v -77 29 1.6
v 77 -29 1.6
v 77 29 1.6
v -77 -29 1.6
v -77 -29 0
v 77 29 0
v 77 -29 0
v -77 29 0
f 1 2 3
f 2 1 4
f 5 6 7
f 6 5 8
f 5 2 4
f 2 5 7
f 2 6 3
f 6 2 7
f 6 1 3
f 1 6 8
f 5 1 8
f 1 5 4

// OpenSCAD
// Seed OpenSCAD file for task 06; complete it from 01_kicad_mechanical_map.csv.
$fn = 32;
board = [154.000, 58.000, 1.600];
wall = 3.400;
module placeholder_board() {
  translate([-board[0]/2, -board[1]/2, 0]) cube(board);
}
placeholder_board();
